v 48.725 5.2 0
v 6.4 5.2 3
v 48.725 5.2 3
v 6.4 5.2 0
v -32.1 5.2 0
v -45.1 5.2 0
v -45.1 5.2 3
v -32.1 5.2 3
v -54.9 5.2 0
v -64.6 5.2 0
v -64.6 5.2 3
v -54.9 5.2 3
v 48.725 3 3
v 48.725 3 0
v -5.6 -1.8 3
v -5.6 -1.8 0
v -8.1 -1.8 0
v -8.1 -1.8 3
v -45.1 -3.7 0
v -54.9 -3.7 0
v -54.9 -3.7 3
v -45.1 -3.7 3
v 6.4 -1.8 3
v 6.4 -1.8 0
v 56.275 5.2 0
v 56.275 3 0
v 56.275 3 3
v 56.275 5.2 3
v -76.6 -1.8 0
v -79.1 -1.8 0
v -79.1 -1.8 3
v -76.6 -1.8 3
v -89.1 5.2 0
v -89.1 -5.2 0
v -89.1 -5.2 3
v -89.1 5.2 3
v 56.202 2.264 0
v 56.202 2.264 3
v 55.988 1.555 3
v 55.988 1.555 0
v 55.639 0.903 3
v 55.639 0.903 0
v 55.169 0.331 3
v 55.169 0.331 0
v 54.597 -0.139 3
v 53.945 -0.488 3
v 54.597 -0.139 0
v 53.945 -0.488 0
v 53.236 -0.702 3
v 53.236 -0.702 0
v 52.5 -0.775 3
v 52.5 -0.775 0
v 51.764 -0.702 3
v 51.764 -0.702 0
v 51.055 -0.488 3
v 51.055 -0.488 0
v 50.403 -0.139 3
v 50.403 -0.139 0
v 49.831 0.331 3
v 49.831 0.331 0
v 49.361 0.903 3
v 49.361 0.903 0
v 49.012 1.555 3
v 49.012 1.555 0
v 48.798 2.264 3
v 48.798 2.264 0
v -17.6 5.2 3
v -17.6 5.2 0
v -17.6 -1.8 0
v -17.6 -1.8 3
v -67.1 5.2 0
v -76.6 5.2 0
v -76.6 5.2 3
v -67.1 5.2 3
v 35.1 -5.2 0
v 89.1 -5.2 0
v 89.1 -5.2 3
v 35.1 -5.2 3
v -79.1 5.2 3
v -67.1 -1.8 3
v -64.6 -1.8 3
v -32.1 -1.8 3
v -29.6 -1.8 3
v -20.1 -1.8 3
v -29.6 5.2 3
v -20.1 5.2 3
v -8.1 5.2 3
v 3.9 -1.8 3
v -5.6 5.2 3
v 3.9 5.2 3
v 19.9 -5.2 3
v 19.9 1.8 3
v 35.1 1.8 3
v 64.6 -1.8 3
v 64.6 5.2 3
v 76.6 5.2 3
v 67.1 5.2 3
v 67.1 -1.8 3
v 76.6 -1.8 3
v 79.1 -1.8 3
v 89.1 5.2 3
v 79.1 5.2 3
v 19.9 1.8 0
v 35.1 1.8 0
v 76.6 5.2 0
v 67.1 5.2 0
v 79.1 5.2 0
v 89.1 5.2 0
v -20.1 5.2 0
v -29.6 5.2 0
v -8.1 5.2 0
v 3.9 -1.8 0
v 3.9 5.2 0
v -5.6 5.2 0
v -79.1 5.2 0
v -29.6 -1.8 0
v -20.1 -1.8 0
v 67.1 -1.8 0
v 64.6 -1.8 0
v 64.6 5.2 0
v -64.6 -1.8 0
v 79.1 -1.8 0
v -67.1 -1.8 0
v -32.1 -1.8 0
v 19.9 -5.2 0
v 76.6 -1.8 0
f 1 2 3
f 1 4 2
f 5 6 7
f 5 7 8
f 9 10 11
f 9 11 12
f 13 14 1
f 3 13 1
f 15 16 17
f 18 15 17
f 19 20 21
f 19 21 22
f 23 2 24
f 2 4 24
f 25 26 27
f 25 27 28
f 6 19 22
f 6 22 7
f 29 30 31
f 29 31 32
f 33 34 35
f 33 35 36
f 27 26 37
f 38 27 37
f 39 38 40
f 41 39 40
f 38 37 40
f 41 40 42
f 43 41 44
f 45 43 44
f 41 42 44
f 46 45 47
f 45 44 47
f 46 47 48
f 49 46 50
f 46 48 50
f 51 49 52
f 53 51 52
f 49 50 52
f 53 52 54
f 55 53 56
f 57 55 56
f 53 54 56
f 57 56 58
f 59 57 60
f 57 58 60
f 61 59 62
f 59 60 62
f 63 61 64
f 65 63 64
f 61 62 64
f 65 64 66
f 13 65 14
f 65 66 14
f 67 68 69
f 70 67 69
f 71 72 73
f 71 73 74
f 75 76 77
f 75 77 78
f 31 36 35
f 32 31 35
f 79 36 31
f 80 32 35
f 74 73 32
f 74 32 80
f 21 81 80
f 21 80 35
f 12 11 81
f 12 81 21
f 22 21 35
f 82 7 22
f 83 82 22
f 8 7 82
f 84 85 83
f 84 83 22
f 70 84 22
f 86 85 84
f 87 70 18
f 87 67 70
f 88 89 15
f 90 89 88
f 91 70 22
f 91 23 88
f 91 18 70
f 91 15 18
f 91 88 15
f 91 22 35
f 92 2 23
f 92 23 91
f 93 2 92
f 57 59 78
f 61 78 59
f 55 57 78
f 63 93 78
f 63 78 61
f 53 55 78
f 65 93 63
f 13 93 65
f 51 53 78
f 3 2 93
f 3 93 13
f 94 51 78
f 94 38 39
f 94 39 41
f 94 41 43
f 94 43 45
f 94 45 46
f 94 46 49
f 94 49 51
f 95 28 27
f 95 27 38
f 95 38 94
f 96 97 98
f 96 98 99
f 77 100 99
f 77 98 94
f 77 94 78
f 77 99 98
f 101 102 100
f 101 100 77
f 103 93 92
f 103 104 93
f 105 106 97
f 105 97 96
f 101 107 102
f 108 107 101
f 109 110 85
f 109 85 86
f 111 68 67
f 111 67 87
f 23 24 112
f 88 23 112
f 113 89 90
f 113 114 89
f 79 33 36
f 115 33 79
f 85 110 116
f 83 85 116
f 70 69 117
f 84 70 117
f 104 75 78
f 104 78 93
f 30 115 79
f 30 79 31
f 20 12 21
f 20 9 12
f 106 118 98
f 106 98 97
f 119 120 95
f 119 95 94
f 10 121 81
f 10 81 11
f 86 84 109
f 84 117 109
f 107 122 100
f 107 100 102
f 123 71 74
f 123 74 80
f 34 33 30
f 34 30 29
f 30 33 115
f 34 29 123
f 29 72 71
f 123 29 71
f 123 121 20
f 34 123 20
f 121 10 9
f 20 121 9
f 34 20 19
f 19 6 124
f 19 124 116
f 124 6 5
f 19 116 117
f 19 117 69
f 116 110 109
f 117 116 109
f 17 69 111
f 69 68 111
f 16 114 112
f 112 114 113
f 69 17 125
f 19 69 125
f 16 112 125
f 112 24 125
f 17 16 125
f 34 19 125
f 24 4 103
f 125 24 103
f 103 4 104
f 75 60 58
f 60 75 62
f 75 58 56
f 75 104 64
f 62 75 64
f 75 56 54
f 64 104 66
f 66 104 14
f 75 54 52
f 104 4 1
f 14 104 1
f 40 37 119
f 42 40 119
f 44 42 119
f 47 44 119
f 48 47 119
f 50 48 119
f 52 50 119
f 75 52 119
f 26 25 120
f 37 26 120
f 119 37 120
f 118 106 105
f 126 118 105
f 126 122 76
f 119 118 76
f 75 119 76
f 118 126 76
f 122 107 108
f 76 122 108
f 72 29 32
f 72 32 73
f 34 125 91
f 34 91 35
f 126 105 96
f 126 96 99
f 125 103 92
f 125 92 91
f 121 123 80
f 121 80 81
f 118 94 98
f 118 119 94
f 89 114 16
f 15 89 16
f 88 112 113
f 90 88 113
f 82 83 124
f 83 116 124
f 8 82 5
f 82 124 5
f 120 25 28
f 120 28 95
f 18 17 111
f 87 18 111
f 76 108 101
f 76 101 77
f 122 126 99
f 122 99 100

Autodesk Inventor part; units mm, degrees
ref_plane "YZ Plane" through (0, 0, 0) normal (1, 0, 0) x (0, 1, 0)
ref_plane "XZ Plane" through (0, 0, 0) normal (0, 1, 0) x (-1, 0, 0)
ref_plane "XY Plane" through (0, 0, 0) normal (0, 0, 1) x (1, 0, 0)
sketch "Sketch1" plane through (0, 0, 0) normal (0, 0, 1) x (1, 0, 0)
  line L0 (89.1, -5.2) -> (-89.1, -5.2)
  line L1 (-89.1, -5.2) -> (-89.1, 5.2)
  line L2 (-89.1, 5.2) -> (89.1, 5.2)
  line L3 (89.1, 5.2) -> (89.1, -5.2)
  line L4 (89.1, -5.2) -> (-89.1, 5.2) construction
  line L5 (-89.1, -5.2) -> (89.1, 5.2) construction
  point P0 (0, 0)
  dimension "d0" = 10.4
  dimension "d1" = 178.2
extrude "Extrusion1" add sketch "Sketch1" along normal blind 3
sketch "Sketch2" plane through (0, 0, 0) normal (0, 0, -1) x (-1, 0, 0)
  line L0 (-89.1, -5.2) -> (89.1, -5.2) projected
  line L1 (45.1, 5.2) -> (54.9, 5.2)
  line L2 (54.9, 5.2) -> (54.9, -3.7)
  line L3 (54.9, -3.7) -> (45.1, -3.7)
  line L4 (45.1, -3.7) -> (45.1, 5.2)
  line L5 (89.1, 5.2) -> (-89.1, 5.2) projected
  arc A0 (-56.275, 3) -> (-48.725, 3) centre (-52.5, 3) ccw
  line L6 (-56.275, 3) -> (-56.275, 5.2)
  line L7 (-48.725, 3) -> (-48.725, 5.2)
  line L8 (-56.275, 5.2) -> (-48.725, 5.2)
  arc A1 (-48.725, 3) -> (-56.275, 3) centre (-52.5, 3) ccw construction
  line L9 (-35.1, 1.8) -> (-19.9, 1.8)
  line L10 (-19.9, 1.8) -> (-19.9, -5.2)
  line L11 (-19.9, -5.2) -> (-35.1, -5.2)
  line L12 (-35.1, -5.2) -> (-35.1, 1.8)
  line L13 (89.1, -5.2) -> (-89.1, -5.2) projected
  point P0 (0, 0)
  point P1 (50, 2.9)
  point P2 (50, 5.2)
  point P3 (-27.5, -2.25)
  point P4 (-27.5, 1.8)
  dimension "d4" = 50
  dimension "d5" = 8.1
  dimension "d6" = 1.5
  dimension "d7" = 9.8
  dimension "d8" = 52.5
  dimension "d9" = 7.55
  dimension "d10" = 8.2
  dimension "d13" = 27.5
  dimension "d14" = 2.95
  dimension "d16" = 7
  dimension "d17" = 15.2
extrude "Extrusion2" cut sketch "Sketch2" against normal through all
sketch "Sketch3" plane through (0, 0, 0) normal (0, 0, -1) x (-1, 0, 0)
  line L0 (-56.275, 5.2) -> (-89.1, 5.2) projected
  line L1 (45.1, 5.2) -> (-48.725, 5.2) projected
  line L2 (89.1, 5.2) -> (54.9, 5.2) projected
  line L3 (-79.1, 5.2) -> (-76.6, 5.2)
  line L4 (-76.6, 5.2) -> (-76.6, -1.8)
  line L5 (-76.6, -1.8) -> (-79.1, -1.8)
  line L6 (-79.1, -1.8) -> (-79.1, 5.2)
  line L7 (-67.1, 5.2) -> (-64.6, 5.2)
  line L8 (-64.6, 5.2) -> (-64.6, -1.8)
  line L9 (-64.6, -1.8) -> (-67.1, -1.8)
  line L10 (-67.1, -1.8) -> (-67.1, 5.2)
  line L11 (-89.1, 5.2) -> (-89.1, -5.2) projected
  line L12 (64.6, 5.2) -> (67.1, 5.2)
  line L13 (67.1, 5.2) -> (67.1, -1.8)
  line L14 (67.1, -1.8) -> (64.6, -1.8)
  line L15 (64.6, -1.8) -> (64.6, 5.2)
  line L16 (76.6, 5.2) -> (79.1, 5.2)
  line L17 (79.1, 5.2) -> (79.1, -1.8)
  line L18 (79.1, -1.8) -> (76.6, -1.8)
  line L19 (76.6, -1.8) -> (76.6, 5.2)
  line L20 (89.1, -5.2) -> (89.1, 5.2) projected
  line L21 (32.1, 5.2) -> (29.6, 5.2)
  line L22 (29.6, 5.2) -> (29.6, -1.8)
  line L23 (29.6, -1.8) -> (32.1, -1.8)
  line L24 (32.1, -1.8) -> (32.1, 5.2)
  line L25 (20.1, 5.2) -> (17.6, 5.2)
  line L26 (17.6, 5.2) -> (17.6, -1.8)
  line L27 (17.6, -1.8) -> (20.1, -1.8)
  line L28 (20.1, -1.8) -> (20.1, 5.2)
  line L29 (8.1, 5.2) -> (5.6, 5.2)
  line L30 (5.6, 5.2) -> (5.6, -1.8)
  line L31 (5.6, -1.8) -> (8.1, -1.8)
  line L32 (8.1, -1.8) -> (8.1, 5.2)
  line L33 (-3.9, 5.2) -> (-6.4, 5.2)
  line L34 (-6.4, 5.2) -> (-6.4, -1.8)
  line L35 (-6.4, -1.8) -> (-3.9, -1.8)
  line L36 (-3.9, -1.8) -> (-3.9, 5.2)
  point P0 (0, 0)
  dimension "d18" = 2.5
  dimension "d19" = 10
  dimension "d21" = 7
  dimension "d24" = 12
  dimension "d25" = 10
  dimension "d26" = 12
  dimension "d28" = 12
  dimension "d29" = 12
  dimension "d30" = 35
  dimension "d31" = 12
extrude "Extrusion3" cut sketch "Sketch3" against normal through all
equation "\"d26\" = d24"
equation "\"d28\" = d31"
equation "\"d29\" = d31"
equation "\"d31\" = d24"
properties part number "Back"
